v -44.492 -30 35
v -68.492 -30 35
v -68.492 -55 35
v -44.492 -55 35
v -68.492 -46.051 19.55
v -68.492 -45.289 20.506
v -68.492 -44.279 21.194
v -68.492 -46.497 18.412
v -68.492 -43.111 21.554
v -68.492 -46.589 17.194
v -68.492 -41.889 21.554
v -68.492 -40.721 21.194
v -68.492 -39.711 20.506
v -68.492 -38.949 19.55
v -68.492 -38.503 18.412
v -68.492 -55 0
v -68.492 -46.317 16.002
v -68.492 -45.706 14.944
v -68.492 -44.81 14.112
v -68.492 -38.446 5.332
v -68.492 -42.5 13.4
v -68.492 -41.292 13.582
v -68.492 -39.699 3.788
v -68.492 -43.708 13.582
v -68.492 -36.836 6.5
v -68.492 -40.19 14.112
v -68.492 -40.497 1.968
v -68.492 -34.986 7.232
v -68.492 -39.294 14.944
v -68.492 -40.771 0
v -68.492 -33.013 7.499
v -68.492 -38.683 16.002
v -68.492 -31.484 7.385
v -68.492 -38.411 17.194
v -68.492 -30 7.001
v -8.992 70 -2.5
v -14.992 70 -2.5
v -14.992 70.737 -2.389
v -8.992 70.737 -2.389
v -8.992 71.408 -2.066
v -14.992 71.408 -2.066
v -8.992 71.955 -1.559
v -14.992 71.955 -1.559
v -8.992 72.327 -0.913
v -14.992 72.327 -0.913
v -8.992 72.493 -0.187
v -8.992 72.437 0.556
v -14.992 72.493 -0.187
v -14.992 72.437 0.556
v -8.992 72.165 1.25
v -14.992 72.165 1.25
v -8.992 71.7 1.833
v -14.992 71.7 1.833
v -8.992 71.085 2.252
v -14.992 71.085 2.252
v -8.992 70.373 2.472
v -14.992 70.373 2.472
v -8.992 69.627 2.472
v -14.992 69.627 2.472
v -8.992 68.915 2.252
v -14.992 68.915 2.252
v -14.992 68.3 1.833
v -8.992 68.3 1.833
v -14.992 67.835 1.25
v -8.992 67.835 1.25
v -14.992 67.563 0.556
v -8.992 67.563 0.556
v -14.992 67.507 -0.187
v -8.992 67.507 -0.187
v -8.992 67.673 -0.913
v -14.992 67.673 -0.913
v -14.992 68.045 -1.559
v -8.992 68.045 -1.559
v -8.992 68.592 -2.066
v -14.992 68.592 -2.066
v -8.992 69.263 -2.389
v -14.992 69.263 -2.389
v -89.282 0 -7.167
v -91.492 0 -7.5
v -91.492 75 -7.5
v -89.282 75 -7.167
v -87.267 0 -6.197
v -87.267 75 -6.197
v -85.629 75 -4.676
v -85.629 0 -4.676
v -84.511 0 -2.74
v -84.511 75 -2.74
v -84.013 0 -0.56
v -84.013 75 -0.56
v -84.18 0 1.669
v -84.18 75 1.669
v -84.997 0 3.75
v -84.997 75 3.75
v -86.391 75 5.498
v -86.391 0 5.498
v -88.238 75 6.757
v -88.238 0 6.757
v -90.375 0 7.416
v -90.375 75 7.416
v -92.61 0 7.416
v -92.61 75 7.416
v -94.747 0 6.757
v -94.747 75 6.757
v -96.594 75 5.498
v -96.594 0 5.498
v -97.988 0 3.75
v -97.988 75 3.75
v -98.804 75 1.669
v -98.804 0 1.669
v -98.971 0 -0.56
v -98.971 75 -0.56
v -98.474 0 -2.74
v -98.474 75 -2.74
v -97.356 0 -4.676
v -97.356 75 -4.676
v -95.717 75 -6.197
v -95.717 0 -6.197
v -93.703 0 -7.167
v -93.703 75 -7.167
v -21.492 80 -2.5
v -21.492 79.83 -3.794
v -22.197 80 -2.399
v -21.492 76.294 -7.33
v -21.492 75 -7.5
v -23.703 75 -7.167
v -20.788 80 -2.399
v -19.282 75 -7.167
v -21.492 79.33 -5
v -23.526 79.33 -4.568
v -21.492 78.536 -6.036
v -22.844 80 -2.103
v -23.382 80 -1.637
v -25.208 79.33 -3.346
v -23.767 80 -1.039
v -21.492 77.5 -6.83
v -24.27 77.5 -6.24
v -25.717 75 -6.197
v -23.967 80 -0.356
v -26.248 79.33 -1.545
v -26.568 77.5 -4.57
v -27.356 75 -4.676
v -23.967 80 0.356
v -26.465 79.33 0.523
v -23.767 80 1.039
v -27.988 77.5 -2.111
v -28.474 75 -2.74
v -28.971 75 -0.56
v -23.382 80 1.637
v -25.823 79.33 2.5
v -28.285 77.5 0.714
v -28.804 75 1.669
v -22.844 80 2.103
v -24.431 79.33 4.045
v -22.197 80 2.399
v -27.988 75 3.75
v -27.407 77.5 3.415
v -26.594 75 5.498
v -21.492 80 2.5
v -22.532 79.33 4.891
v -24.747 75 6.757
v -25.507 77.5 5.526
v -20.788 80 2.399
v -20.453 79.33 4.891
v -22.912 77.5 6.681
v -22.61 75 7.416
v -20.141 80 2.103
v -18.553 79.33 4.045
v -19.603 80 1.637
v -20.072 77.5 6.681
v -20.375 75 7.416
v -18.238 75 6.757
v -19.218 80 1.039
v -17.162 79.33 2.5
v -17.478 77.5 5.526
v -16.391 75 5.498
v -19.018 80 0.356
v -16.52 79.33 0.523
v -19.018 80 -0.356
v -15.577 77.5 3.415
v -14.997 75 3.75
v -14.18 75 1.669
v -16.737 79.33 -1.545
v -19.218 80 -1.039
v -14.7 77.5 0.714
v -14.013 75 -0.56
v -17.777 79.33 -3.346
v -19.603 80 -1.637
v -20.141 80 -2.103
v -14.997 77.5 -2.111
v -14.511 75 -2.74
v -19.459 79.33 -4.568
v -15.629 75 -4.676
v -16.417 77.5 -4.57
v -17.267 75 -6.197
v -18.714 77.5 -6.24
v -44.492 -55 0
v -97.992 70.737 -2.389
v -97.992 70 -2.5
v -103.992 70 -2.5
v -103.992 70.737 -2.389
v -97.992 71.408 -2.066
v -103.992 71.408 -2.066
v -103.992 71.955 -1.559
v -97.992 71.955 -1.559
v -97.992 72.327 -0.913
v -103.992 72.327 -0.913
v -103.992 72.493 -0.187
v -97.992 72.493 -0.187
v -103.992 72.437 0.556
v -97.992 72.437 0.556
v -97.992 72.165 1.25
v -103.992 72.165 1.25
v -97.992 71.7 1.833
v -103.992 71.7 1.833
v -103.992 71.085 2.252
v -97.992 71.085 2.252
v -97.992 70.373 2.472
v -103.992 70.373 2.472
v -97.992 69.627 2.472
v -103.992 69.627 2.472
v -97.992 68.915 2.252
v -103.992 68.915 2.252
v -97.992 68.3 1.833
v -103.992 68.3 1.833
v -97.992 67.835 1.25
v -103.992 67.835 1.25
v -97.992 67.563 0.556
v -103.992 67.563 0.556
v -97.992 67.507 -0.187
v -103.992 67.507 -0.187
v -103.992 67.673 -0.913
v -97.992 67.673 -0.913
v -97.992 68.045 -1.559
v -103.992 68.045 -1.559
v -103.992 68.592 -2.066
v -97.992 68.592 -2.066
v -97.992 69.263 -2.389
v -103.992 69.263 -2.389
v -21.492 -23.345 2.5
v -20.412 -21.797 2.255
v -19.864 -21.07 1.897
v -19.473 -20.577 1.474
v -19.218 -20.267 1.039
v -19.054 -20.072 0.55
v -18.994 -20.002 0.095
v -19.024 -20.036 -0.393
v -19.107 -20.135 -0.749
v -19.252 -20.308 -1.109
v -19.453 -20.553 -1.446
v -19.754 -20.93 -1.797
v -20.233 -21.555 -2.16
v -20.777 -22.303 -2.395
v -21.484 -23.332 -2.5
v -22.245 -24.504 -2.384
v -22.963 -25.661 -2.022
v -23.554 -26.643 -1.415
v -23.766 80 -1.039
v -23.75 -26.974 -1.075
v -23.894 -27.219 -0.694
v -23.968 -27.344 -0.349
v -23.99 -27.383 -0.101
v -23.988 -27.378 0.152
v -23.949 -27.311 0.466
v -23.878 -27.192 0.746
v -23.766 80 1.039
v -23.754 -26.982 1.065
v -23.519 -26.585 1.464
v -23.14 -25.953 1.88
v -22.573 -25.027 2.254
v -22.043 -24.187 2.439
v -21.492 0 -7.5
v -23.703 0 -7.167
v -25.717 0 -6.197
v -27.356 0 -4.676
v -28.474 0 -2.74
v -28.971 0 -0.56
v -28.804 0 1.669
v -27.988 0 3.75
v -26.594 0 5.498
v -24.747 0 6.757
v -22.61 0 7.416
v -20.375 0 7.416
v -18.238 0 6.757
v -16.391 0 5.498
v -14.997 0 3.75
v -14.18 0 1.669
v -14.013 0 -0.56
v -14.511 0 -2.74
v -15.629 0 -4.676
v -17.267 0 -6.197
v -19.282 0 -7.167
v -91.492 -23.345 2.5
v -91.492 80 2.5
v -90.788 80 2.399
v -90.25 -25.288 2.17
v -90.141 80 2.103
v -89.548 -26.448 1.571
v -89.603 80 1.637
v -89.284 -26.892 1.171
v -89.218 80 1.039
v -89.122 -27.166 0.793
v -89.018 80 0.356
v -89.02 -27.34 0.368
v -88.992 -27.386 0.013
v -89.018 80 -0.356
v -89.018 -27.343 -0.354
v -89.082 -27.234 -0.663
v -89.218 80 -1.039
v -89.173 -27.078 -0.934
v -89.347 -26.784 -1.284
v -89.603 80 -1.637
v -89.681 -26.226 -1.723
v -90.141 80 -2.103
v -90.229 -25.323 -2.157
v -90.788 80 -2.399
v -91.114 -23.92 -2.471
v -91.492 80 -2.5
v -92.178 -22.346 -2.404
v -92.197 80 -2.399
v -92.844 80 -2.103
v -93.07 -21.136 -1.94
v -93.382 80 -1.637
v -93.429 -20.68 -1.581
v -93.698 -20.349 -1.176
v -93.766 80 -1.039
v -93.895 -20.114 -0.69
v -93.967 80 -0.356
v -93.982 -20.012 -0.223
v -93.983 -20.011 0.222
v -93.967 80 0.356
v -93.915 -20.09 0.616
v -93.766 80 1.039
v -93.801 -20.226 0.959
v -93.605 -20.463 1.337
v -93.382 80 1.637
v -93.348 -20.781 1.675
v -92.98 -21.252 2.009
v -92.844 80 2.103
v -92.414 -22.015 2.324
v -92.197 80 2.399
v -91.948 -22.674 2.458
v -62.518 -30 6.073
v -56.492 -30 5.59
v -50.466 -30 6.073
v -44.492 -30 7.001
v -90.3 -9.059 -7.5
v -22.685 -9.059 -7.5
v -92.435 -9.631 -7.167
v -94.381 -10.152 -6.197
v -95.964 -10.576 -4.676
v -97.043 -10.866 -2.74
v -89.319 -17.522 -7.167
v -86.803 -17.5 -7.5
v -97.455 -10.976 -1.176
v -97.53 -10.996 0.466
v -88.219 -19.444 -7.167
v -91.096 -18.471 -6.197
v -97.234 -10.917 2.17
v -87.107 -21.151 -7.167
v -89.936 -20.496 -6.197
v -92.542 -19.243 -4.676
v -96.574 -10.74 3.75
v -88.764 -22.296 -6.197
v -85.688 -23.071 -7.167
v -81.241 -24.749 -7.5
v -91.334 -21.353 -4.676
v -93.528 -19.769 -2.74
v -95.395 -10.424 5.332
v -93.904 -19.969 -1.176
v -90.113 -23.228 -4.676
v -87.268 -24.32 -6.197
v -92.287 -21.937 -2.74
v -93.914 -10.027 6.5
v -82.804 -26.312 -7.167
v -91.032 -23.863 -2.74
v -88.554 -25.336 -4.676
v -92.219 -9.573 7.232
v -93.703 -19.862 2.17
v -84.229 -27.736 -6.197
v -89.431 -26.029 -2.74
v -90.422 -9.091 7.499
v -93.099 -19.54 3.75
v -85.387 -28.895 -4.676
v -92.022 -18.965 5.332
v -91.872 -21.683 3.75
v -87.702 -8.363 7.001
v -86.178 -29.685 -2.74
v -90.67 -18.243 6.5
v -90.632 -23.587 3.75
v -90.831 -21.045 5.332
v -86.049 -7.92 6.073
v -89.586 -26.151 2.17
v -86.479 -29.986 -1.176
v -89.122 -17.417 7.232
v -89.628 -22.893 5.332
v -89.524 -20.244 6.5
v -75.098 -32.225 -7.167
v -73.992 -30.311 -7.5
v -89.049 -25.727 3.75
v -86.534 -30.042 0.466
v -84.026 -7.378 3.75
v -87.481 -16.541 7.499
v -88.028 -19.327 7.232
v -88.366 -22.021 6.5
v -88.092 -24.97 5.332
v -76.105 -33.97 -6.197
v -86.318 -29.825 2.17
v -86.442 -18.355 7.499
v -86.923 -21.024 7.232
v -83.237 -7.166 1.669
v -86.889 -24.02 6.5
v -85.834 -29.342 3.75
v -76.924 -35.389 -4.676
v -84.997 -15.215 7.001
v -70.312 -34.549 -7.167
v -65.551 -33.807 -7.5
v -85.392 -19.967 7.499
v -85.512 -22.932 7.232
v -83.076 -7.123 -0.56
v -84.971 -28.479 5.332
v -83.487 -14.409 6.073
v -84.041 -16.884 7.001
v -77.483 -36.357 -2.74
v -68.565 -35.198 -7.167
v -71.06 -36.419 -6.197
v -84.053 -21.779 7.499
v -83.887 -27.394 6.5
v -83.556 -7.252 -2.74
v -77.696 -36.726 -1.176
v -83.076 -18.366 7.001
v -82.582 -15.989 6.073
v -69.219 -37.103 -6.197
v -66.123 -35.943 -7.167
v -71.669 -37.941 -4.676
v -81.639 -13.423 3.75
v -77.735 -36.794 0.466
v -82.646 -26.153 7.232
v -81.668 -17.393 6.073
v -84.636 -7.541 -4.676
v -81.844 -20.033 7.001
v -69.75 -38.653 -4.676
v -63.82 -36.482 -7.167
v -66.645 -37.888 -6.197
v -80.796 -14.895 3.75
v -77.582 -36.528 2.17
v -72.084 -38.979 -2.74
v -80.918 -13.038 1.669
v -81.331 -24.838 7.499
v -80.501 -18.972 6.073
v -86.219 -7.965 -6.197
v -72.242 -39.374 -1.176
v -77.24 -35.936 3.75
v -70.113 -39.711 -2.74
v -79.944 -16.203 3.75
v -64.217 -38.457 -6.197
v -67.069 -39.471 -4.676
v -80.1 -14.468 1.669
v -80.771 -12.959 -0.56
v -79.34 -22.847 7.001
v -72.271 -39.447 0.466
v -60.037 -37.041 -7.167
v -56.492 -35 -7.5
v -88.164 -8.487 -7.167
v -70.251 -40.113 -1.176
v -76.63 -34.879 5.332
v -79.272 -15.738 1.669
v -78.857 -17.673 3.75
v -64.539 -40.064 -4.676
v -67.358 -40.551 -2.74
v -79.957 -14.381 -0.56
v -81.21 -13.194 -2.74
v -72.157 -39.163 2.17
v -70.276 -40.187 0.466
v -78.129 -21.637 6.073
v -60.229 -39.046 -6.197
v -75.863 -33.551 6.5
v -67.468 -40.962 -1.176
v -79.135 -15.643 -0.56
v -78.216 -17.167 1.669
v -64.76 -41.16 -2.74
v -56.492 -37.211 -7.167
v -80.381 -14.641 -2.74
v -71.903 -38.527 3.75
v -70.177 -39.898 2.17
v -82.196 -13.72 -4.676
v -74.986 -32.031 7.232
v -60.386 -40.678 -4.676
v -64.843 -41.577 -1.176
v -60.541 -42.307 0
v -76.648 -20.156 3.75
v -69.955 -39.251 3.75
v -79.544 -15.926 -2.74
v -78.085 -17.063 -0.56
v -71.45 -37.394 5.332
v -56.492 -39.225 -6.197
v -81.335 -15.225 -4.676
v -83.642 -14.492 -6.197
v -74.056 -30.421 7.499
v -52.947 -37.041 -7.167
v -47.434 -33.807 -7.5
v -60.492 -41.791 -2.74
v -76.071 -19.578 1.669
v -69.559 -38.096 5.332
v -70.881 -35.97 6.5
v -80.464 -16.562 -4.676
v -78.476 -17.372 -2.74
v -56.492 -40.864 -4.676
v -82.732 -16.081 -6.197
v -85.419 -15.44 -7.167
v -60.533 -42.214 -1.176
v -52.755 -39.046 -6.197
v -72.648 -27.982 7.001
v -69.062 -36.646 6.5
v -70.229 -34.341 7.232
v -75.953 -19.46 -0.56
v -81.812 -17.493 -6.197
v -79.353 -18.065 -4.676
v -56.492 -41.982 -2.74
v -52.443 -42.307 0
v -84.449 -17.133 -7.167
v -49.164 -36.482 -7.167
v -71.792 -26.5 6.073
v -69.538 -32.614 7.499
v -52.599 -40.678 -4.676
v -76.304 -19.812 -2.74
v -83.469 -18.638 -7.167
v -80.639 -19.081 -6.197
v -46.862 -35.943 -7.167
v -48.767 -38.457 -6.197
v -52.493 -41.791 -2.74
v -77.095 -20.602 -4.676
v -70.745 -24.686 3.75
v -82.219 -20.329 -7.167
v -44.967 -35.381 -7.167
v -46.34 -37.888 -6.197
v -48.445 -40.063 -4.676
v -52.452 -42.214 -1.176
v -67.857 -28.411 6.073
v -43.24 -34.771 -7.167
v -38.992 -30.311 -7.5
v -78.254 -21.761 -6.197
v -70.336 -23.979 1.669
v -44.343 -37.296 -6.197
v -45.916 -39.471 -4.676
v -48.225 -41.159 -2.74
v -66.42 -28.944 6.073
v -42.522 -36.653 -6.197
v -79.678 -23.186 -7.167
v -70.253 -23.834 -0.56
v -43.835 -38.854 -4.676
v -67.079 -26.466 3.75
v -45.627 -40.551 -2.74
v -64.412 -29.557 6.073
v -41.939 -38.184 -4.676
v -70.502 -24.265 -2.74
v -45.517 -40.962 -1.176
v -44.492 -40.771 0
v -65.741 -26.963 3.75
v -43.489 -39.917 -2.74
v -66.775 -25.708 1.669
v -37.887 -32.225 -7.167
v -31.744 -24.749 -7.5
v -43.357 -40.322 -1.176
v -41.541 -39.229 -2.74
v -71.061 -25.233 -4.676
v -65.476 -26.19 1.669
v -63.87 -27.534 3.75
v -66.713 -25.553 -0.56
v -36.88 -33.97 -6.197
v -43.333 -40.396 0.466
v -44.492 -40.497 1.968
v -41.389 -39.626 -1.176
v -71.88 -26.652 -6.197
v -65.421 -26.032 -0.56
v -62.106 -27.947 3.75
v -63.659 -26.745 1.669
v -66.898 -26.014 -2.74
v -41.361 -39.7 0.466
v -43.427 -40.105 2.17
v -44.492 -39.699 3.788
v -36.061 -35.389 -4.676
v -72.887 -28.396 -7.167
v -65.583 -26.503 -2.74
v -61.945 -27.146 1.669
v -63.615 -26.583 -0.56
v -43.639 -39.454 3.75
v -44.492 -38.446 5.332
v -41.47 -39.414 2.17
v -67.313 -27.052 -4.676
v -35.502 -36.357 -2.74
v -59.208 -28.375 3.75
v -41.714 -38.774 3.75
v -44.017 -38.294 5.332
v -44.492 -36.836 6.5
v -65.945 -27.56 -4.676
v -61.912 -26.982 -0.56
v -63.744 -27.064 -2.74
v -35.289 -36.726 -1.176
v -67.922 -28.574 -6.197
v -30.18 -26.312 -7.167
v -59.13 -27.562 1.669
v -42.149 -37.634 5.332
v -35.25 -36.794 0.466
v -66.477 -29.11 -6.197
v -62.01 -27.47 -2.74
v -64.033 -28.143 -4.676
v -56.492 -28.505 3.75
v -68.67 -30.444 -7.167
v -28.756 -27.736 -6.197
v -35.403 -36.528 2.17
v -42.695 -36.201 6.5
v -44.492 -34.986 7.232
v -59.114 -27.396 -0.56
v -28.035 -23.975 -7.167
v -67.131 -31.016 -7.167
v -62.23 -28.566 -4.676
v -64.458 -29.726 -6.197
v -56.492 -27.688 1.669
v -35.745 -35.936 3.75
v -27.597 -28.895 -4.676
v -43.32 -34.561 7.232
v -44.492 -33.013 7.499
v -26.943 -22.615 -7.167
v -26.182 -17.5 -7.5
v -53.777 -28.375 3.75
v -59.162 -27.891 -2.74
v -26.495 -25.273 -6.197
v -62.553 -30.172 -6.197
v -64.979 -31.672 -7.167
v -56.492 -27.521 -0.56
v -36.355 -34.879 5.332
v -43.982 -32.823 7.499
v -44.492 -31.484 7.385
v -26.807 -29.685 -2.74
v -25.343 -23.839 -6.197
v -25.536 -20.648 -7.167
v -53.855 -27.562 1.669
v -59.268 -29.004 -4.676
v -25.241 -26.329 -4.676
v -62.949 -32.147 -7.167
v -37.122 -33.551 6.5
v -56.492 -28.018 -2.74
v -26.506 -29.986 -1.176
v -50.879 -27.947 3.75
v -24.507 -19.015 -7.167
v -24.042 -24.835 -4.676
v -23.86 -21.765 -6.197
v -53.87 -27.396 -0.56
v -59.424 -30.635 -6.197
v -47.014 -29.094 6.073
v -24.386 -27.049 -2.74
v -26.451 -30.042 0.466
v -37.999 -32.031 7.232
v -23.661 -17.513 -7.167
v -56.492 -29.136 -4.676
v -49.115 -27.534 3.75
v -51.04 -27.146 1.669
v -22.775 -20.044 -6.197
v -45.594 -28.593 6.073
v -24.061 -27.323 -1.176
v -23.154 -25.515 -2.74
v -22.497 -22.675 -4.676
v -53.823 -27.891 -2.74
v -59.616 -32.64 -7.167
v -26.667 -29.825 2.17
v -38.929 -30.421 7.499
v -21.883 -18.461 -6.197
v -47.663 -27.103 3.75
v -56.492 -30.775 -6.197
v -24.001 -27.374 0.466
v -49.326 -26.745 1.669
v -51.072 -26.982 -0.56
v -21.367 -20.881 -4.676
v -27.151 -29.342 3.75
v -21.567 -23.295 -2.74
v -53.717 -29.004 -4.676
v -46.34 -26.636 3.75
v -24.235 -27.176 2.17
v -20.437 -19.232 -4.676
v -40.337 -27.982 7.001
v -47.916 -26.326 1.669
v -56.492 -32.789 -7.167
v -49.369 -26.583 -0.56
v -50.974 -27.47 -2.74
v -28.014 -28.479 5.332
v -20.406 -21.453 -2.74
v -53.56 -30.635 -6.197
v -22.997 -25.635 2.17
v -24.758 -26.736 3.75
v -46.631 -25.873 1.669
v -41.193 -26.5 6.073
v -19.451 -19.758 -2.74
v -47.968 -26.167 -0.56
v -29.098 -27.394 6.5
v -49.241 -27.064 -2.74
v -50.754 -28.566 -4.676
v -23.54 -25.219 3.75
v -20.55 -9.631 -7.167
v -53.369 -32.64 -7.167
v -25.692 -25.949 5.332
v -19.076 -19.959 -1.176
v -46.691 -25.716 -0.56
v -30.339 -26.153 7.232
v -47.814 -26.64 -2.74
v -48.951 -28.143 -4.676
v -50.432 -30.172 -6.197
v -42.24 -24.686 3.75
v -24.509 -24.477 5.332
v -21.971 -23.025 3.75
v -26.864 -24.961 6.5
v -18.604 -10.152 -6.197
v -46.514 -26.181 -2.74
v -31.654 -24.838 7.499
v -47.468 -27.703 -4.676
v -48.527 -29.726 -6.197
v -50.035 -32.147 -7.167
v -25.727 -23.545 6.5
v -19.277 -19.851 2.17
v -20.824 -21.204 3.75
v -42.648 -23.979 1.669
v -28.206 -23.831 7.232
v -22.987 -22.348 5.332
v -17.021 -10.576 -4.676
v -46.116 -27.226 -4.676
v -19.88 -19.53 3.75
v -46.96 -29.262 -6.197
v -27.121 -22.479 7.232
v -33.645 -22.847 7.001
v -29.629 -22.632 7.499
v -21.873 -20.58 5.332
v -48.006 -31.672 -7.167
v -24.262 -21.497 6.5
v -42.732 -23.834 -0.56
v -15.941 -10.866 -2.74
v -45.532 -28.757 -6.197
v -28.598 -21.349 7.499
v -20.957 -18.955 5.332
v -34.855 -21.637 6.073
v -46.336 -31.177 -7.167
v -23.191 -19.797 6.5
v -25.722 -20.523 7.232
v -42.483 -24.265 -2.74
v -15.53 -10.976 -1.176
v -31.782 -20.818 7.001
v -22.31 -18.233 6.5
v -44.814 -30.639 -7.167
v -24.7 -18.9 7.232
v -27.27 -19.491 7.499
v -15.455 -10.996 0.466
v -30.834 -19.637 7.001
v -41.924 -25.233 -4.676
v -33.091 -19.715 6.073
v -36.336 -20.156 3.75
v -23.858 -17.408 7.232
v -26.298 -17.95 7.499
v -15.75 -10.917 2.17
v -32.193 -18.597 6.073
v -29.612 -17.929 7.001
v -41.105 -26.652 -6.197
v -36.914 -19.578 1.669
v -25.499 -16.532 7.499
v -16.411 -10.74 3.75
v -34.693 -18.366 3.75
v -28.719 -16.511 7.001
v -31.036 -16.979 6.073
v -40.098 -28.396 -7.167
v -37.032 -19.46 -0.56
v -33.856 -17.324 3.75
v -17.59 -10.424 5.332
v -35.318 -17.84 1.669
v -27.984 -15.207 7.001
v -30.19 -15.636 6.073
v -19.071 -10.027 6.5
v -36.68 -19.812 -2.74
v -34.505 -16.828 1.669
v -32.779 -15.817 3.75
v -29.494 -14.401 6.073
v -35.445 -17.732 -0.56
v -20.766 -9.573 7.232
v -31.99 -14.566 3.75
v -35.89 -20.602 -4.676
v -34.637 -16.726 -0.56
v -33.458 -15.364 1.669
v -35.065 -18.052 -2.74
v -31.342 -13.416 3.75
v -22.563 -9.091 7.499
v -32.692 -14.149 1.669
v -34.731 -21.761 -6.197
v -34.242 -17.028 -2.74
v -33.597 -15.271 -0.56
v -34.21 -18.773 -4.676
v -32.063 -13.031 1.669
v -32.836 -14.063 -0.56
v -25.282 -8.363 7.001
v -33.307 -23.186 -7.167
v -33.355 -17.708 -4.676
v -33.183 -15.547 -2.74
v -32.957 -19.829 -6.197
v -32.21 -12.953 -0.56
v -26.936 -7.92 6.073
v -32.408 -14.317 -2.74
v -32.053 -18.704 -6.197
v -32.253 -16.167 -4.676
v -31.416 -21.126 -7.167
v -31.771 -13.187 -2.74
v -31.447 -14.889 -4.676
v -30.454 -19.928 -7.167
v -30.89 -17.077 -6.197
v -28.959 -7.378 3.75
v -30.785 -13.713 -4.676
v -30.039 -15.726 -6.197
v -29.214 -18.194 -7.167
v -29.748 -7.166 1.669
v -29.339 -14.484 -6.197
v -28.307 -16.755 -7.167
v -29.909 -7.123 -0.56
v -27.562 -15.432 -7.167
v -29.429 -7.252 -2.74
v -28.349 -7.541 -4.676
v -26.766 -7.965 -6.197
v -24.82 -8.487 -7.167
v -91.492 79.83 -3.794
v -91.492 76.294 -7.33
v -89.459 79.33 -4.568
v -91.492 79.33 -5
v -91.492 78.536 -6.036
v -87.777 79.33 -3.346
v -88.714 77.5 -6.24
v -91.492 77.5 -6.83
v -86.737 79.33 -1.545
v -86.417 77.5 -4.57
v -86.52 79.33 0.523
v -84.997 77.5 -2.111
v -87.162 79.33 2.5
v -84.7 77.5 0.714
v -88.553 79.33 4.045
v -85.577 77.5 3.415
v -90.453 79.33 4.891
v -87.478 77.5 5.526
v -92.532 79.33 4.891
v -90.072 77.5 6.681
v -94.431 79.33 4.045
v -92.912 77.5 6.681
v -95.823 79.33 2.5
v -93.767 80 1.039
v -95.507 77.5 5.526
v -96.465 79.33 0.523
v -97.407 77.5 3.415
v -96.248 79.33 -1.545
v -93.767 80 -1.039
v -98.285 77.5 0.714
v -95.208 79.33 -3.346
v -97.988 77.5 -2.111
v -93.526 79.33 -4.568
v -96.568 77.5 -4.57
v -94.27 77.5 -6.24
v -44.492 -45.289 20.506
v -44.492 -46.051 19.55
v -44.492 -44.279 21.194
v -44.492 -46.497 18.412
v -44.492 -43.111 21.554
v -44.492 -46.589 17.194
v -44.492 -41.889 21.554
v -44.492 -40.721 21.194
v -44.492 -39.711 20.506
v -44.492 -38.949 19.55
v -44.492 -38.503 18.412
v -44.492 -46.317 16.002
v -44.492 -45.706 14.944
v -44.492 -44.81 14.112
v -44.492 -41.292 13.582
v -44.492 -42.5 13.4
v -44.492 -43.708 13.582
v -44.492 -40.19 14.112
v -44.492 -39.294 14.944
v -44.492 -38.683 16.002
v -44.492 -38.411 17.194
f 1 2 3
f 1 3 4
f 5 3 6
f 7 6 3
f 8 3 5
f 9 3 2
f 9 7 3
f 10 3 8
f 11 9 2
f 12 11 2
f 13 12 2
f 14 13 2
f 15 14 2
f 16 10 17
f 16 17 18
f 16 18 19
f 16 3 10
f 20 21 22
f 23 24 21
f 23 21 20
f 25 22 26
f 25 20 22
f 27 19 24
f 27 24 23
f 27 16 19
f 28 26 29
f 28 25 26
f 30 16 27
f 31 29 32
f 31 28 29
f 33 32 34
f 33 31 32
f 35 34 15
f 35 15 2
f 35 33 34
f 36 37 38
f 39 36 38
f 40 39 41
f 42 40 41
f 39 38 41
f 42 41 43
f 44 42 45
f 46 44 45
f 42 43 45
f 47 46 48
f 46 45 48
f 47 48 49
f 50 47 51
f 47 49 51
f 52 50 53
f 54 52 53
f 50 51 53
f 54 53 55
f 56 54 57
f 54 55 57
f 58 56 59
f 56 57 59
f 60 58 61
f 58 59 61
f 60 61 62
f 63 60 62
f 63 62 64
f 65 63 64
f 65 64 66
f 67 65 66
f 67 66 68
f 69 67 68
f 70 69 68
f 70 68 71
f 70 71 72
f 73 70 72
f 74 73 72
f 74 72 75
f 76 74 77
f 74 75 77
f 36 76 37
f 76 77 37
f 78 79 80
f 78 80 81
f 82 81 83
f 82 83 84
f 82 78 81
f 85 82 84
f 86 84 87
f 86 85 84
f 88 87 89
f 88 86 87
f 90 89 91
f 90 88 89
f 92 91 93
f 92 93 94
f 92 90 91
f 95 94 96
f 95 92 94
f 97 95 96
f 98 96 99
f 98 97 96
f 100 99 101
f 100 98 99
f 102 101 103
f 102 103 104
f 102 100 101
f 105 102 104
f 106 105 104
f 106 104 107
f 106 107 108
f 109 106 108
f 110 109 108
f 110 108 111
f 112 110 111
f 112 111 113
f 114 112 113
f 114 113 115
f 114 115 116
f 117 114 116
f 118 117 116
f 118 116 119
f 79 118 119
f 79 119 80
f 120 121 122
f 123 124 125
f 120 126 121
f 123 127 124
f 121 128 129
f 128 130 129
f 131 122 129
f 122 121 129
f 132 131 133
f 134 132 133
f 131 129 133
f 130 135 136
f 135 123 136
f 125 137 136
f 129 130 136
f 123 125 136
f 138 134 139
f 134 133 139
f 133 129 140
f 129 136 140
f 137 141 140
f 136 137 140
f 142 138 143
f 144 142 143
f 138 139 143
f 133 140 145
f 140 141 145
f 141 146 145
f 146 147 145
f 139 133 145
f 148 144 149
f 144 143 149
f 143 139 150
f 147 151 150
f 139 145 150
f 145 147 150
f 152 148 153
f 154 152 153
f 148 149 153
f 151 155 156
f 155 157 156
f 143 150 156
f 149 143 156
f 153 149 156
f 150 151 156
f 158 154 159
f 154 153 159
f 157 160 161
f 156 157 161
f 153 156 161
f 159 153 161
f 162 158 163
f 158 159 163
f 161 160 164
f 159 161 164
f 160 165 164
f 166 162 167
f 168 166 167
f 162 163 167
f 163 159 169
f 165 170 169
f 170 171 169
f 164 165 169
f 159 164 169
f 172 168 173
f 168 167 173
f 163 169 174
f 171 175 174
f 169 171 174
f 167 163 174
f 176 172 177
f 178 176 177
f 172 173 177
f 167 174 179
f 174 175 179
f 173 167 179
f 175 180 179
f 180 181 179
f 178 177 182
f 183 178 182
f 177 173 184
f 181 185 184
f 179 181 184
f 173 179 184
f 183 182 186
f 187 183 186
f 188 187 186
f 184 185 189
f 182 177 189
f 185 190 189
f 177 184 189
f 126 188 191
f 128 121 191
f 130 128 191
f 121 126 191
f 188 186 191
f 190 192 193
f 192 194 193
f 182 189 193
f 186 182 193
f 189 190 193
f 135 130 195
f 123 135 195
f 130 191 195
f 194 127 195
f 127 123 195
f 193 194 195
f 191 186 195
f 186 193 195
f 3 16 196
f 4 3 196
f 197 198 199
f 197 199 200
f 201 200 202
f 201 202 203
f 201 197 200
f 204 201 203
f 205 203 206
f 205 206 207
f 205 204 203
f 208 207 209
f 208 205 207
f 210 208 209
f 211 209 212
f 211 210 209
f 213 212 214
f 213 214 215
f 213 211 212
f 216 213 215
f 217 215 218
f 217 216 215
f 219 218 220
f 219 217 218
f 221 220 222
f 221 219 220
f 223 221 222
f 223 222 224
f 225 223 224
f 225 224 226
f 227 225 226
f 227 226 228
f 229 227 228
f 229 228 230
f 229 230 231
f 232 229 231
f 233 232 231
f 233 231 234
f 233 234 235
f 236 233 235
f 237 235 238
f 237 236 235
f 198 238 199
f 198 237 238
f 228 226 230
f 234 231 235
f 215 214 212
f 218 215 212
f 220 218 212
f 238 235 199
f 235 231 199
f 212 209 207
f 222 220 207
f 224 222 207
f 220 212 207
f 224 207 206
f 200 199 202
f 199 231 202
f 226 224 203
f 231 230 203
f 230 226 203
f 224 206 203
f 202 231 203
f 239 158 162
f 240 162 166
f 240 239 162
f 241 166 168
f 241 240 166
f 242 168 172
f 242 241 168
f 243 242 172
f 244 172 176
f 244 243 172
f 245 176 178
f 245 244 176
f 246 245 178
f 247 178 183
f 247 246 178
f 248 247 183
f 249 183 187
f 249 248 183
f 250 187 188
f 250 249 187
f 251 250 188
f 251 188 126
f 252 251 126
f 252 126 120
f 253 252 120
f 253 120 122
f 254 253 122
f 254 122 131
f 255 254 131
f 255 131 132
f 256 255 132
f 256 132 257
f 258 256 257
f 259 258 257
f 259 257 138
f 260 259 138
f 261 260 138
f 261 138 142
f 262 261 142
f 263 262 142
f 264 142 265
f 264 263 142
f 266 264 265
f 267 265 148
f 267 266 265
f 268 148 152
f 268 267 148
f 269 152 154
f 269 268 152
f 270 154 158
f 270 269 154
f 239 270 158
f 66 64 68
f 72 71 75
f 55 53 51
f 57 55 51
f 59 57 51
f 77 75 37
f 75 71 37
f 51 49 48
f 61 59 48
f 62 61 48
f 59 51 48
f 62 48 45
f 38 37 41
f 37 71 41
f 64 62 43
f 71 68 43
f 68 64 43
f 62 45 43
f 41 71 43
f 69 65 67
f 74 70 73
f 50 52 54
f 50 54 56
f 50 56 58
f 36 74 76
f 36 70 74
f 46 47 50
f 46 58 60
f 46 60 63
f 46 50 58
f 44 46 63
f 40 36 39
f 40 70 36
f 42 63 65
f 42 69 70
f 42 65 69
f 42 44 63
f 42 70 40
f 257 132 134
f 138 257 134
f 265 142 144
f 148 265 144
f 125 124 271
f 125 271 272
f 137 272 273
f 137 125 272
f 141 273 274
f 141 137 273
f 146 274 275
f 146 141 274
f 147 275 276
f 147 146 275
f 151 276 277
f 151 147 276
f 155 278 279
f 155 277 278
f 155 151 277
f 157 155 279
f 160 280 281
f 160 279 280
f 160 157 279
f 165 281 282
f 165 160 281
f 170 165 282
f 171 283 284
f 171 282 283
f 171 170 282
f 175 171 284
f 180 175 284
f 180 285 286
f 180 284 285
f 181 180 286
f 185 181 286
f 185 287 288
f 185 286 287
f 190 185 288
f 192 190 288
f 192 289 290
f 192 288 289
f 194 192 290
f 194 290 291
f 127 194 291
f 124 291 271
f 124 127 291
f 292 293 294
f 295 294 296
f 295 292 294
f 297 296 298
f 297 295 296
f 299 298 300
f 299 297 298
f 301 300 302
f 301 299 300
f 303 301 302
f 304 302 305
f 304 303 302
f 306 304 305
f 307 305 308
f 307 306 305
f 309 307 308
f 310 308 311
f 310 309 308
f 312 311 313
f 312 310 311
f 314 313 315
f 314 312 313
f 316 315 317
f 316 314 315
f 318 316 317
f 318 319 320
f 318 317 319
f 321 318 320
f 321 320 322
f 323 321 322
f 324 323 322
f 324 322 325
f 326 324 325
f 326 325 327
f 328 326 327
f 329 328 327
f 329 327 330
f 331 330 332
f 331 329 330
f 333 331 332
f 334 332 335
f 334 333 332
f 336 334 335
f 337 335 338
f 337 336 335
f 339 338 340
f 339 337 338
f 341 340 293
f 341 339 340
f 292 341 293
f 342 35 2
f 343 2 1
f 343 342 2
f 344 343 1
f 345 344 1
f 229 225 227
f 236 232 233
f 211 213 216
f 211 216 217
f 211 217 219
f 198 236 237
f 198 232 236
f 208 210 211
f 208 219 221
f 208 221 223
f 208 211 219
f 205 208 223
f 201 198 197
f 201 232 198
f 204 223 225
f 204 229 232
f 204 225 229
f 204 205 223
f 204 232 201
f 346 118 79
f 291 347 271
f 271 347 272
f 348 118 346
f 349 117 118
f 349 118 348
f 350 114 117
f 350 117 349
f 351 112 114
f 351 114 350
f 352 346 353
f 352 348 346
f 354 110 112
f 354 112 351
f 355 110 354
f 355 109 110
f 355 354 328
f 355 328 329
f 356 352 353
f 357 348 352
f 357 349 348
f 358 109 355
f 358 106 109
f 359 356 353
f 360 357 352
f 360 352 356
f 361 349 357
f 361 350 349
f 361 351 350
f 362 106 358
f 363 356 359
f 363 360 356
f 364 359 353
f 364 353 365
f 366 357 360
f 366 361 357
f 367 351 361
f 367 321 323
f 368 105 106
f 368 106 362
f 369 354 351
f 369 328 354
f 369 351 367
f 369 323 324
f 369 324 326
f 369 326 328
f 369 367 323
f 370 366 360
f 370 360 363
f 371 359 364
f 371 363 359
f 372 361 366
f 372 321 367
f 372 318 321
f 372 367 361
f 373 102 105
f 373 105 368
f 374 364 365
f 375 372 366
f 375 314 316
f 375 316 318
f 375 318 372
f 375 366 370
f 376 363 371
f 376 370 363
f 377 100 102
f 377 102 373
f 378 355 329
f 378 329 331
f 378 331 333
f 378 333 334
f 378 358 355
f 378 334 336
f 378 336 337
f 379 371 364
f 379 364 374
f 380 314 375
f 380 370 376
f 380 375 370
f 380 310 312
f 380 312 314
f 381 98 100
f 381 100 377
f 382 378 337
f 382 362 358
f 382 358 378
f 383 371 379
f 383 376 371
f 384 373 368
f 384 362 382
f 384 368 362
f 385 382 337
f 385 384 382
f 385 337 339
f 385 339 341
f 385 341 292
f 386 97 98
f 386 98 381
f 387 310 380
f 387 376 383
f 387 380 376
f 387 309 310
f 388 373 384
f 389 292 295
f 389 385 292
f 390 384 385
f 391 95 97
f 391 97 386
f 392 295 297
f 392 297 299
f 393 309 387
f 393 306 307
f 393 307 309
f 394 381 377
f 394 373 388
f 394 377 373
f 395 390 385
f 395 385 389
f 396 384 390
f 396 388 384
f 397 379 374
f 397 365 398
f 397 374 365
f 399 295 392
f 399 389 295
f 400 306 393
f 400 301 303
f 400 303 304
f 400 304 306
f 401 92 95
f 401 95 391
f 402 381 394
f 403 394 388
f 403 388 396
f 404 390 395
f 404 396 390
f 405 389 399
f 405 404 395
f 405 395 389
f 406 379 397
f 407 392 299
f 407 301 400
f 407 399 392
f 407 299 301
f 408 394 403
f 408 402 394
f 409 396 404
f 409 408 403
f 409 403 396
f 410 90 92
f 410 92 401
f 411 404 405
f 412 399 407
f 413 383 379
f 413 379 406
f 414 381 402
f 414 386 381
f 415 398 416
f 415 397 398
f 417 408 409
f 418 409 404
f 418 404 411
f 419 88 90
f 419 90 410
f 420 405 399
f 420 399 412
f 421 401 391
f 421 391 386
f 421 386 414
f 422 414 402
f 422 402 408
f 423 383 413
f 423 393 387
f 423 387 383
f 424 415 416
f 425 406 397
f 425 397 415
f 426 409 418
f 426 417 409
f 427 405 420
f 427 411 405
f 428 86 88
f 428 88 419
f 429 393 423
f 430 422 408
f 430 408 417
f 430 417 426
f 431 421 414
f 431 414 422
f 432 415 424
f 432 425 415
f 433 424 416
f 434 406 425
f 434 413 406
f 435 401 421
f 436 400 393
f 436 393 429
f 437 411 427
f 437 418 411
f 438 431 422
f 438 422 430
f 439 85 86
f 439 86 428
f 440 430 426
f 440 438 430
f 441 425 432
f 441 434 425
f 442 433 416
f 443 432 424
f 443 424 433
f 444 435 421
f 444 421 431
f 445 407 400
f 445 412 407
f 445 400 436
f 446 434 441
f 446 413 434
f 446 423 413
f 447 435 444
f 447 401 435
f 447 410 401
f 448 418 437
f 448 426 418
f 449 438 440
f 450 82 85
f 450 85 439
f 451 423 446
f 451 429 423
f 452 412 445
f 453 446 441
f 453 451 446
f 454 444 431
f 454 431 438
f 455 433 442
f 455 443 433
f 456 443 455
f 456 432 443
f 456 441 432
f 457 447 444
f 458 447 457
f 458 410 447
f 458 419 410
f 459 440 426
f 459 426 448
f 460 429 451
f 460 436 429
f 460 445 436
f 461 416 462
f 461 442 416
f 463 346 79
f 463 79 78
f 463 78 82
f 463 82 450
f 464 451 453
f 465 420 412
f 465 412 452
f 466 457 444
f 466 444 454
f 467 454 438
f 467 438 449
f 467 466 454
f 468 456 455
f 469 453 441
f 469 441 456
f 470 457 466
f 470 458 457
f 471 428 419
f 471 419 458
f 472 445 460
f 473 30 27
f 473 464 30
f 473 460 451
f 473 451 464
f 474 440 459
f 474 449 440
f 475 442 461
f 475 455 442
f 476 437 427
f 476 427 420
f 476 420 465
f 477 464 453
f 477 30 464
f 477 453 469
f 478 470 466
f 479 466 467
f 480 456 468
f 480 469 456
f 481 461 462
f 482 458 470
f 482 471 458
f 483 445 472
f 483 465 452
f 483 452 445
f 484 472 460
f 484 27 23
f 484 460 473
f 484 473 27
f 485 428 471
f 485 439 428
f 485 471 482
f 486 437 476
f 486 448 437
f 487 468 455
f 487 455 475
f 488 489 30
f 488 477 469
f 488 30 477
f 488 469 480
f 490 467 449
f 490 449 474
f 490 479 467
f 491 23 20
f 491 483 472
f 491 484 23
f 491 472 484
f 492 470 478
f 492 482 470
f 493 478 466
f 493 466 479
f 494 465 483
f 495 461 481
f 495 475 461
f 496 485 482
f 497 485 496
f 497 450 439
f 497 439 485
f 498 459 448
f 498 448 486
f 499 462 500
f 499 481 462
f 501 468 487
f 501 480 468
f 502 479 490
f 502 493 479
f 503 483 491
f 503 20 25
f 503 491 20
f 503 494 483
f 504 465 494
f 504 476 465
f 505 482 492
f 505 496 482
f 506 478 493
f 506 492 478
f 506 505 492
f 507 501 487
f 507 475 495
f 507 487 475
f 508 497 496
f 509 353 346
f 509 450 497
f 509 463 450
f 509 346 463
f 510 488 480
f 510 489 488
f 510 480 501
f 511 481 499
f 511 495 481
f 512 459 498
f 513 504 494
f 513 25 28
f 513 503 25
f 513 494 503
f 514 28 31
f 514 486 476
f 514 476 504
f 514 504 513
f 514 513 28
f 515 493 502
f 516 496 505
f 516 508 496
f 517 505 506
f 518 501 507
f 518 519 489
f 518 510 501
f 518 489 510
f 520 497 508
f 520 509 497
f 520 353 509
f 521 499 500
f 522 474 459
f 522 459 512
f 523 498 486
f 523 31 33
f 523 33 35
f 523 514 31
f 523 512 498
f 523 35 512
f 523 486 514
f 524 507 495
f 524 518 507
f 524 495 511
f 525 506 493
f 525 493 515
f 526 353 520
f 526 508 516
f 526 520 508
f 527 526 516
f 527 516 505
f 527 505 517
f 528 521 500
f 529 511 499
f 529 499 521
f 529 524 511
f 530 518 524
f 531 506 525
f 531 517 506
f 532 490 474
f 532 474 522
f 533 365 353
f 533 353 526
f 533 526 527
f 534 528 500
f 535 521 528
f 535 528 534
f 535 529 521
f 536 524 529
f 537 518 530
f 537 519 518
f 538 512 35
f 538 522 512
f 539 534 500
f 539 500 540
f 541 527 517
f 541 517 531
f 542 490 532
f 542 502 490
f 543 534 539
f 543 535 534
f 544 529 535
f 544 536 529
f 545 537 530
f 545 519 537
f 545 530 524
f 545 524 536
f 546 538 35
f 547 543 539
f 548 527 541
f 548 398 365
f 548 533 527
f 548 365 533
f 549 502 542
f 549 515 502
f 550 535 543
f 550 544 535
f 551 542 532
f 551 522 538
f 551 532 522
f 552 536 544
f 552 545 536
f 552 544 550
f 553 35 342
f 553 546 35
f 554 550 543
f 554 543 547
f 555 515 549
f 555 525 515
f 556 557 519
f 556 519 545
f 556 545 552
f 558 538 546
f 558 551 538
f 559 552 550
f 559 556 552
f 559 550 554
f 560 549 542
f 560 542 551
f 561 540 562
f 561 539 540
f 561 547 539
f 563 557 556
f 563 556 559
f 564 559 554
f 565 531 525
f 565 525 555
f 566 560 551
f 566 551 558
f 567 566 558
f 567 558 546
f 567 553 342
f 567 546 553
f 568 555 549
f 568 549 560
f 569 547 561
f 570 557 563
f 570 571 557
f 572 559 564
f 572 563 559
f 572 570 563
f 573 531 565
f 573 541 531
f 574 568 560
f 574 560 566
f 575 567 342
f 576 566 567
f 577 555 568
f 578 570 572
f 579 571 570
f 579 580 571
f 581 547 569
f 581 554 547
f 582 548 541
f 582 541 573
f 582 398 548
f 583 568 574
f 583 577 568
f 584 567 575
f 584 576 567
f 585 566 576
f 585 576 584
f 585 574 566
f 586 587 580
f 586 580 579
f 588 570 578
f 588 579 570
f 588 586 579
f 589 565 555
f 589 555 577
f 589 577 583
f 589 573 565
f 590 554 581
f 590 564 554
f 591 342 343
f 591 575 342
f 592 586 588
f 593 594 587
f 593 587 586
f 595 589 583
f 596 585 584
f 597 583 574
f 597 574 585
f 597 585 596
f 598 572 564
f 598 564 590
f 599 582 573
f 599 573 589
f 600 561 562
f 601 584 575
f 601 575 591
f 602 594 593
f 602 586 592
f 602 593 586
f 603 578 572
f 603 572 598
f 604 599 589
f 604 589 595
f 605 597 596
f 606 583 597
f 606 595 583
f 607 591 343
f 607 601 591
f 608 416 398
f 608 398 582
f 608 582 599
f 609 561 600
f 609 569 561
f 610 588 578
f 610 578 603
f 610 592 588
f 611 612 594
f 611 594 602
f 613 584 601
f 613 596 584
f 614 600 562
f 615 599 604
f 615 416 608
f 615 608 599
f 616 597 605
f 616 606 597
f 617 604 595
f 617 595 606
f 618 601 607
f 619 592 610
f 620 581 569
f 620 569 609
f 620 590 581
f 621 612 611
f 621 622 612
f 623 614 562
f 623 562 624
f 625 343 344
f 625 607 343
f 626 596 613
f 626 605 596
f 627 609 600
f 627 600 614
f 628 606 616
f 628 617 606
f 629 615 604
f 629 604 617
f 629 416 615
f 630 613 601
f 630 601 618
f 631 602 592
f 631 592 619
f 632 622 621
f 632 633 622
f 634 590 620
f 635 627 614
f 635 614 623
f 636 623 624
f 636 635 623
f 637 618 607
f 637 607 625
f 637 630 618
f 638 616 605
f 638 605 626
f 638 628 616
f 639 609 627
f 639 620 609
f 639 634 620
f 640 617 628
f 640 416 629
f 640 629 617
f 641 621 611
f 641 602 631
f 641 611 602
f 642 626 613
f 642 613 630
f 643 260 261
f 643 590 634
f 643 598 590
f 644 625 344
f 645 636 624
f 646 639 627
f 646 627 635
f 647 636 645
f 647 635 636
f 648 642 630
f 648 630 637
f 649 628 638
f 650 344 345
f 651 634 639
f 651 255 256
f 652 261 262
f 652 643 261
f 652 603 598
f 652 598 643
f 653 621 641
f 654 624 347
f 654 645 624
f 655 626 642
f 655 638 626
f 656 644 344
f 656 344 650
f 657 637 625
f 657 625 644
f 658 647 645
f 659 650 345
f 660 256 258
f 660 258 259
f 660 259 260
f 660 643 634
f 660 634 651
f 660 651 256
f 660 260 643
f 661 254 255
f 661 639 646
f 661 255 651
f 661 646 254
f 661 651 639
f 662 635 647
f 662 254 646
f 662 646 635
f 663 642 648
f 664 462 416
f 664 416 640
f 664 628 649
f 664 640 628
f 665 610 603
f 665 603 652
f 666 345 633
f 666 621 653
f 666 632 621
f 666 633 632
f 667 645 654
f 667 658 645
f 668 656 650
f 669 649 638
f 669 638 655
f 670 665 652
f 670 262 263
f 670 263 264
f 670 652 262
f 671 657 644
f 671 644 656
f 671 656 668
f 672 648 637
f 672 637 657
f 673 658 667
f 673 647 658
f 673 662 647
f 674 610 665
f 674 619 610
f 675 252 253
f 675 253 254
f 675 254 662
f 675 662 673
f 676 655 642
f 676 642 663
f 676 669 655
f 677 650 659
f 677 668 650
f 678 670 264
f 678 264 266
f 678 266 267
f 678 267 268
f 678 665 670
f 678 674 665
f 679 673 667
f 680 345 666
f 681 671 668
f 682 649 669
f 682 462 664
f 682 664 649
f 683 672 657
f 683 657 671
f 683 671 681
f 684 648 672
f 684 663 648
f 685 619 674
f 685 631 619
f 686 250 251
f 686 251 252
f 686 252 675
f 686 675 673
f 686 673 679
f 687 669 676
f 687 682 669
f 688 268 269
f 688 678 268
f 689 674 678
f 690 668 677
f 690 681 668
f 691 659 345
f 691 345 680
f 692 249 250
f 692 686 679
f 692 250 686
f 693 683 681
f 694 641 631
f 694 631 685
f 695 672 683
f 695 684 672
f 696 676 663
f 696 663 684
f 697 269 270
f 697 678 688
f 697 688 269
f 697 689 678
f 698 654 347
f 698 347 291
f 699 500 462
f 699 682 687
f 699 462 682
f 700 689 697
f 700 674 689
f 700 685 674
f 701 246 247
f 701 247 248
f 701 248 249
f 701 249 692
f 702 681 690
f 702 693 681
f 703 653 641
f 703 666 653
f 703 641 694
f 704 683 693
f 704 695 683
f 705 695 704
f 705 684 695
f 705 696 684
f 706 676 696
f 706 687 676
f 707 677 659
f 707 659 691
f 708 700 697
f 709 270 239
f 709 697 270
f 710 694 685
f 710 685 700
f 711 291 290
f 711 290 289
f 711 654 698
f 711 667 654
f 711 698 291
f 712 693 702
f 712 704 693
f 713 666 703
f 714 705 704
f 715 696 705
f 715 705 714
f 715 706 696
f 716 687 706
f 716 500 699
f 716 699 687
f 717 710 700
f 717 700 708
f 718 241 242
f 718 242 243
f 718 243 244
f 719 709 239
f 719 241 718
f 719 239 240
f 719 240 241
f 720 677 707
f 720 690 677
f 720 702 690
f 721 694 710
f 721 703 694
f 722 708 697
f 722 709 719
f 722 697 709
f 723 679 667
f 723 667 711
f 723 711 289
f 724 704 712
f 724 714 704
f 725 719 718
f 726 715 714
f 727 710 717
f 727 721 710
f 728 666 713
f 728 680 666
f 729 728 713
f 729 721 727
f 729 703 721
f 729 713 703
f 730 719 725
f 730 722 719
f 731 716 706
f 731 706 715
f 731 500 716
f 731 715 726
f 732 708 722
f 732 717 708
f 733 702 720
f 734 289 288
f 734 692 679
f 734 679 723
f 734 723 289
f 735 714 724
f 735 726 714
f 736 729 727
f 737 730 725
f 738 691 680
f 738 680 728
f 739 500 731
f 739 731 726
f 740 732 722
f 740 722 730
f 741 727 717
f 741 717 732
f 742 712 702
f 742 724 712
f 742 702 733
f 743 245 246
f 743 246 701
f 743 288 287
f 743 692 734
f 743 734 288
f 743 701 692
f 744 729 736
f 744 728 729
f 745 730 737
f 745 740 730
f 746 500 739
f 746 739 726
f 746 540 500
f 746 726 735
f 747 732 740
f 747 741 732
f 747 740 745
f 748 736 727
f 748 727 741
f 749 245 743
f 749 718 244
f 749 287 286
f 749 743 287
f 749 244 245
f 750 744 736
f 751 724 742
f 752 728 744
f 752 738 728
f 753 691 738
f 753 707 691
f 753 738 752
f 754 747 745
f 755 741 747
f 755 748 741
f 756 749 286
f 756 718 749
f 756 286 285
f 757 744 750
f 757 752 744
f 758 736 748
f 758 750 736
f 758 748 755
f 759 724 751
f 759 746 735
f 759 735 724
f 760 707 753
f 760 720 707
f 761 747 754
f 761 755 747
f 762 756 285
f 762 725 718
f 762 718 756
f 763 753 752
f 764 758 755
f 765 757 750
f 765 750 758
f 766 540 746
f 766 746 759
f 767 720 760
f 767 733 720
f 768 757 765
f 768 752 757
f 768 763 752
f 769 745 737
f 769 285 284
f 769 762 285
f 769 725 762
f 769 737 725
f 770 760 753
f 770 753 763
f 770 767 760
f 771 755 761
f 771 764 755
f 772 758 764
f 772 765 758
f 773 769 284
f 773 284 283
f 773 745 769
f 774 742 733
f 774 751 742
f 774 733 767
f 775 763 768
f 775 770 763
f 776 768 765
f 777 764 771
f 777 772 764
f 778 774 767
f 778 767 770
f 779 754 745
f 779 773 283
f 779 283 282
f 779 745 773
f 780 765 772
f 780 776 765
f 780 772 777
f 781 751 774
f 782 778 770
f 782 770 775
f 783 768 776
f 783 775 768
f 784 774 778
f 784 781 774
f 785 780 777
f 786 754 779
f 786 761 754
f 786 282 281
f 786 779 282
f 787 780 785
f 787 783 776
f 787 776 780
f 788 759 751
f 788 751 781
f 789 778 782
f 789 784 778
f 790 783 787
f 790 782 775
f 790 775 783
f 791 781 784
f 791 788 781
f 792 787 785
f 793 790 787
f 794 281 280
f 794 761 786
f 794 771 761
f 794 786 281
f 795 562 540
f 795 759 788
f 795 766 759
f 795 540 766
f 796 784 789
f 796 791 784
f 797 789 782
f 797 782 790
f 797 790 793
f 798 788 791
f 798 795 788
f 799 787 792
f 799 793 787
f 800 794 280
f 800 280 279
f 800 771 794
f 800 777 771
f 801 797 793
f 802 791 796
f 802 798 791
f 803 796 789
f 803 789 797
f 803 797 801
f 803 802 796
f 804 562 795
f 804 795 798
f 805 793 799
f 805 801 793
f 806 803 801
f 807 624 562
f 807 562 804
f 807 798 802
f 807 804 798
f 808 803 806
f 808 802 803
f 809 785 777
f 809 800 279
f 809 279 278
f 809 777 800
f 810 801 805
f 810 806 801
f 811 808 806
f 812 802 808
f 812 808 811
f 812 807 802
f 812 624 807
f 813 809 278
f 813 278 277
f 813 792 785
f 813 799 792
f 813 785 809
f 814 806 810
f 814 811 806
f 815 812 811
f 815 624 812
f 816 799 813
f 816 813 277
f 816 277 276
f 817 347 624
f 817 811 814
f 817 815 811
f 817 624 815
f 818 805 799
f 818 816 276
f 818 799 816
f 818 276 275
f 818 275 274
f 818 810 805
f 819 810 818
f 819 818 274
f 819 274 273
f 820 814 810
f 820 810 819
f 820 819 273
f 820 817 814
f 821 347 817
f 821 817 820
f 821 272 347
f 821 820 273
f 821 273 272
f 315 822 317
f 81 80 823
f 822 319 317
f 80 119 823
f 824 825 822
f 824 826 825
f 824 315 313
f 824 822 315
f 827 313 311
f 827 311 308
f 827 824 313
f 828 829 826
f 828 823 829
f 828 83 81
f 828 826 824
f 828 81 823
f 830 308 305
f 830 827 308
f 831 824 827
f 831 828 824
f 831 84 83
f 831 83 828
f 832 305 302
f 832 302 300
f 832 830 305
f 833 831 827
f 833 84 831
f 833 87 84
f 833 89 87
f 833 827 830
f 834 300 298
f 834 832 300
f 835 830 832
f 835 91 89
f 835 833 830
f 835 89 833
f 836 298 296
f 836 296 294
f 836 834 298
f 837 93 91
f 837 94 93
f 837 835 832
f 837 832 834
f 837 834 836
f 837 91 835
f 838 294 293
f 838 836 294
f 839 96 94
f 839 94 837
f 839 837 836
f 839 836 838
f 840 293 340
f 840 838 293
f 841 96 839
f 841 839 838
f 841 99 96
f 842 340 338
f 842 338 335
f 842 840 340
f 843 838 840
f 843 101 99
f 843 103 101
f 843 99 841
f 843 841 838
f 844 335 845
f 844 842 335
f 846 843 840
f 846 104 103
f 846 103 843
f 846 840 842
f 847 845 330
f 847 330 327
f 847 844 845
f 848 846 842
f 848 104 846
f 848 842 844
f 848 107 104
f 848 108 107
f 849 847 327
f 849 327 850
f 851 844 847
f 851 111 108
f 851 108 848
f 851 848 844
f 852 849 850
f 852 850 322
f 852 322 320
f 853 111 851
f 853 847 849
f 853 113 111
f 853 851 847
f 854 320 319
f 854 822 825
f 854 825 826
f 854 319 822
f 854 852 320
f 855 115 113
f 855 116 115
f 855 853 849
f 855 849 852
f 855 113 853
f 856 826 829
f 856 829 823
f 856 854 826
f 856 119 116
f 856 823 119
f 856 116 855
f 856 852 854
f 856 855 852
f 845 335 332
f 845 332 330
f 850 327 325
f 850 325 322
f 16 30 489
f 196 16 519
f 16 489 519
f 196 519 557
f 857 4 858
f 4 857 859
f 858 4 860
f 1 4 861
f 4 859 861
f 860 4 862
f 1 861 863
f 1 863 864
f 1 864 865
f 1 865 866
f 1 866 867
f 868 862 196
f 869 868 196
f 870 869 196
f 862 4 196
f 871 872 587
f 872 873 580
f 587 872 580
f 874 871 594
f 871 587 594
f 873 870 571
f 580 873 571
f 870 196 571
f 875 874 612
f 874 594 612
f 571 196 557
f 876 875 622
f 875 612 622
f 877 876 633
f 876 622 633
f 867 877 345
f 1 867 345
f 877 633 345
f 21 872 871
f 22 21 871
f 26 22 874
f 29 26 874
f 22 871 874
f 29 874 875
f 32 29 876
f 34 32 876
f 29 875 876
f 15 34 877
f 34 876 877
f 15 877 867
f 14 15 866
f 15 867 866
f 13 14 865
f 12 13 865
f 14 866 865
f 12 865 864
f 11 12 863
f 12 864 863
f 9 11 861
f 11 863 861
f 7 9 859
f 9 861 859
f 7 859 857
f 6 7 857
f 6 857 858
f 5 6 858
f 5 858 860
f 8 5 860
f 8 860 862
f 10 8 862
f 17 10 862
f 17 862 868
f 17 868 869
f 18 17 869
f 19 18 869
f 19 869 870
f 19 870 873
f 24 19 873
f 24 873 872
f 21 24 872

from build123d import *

# Parameters (mm, degrees)
SWEEP1_PROFILE_R        = 7.5
SKETCH7_W               = 24
SKETCH7_H               = 25
BOSS_EXTRUDE1_DEPTH     = 35
SKETCH8_R               = 4.1
CUT_EXTRUDE1_DEPTH      = 103.933230873
CUT_EXTRUDE2_DEPTH      = 133.001873463
CUT_EXTRUDE2_DEPTH_BACK = 133.001873463
SKETCH9_R               = 2.5
BOSS_EXTRUDE2_START     = 41.5
SKETCH11_R              = 2.5
BOSS_EXTRUDE2_DEPTH     = 6
BOSS_EXTRUDE3_START     = -41.5
SKETCH11_2_R            = 2.5
BOSS_EXTRUDE3_DEPTH     = 6
FILLET1_R               = 5


with BuildPart() as part:
    # Sweep1: sweep along a path in Sketch1
    with BuildLine(Plane.XY) as sweep1_path:
        Line((-91.492396531, 80), (-91.492396531, 0))
        ThreePointArc((-91.492396531, 0), (-56.492396531, -35), (-21.492396531, 0))
        Line((-21.492396531, 0), (-21.492396531, 80))
    # Sweep1 profile (on start of the path) → Sweep1 (sweep)
    with BuildSketch(Plane(origin=(-91.492396531, 80, 0), x_dir=(0, 0, -1), z_dir=(0, -1, 0))):
        Circle(SWEEP1_PROFILE_R)
    sweep(path=sweep1_path.line)

    # Sketch7 → Boss-Extrude1 (add)
    with BuildSketch(Plane.XY):
        with Locations((-56.492396531, -42.5)):
            Rectangle(SKETCH7_W, SKETCH7_H)
    extrude(amount=BOSS_EXTRUDE1_DEPTH)

    # Sketch8 → Cut-Extrude1 (cut, through all)
    with BuildSketch(Plane(origin=(-44.492396531, 0, 0), x_dir=(0, 0, -1), z_dir=(1, 0, 0))):
        with Locations((-17.5, -42.5)):
            Circle(SKETCH8_R)
    extrude(amount=-CUT_EXTRUDE1_DEPTH, mode=Mode.SUBTRACT)

    # Sketch9 → Cut-Extrude2 (cut, two sides: drawn at the far end of the back side and taken through both)
    with BuildSketch(Plane(origin=(0, 0, 0), x_dir=(1, 0, 0), z_dir=(0, 1, 0)).offset(-CUT_EXTRUDE2_DEPTH_BACK)):
        with Locations(Location((-91.492396531, 0, 0), (0, 0, 270))):
            Circle(SKETCH9_R)
        with Locations(Location((-21.492396531, 0, 0), (0, 0, 270))):
            Circle(SKETCH9_R)
    extrude(amount=CUT_EXTRUDE2_DEPTH + CUT_EXTRUDE2_DEPTH_BACK, mode=Mode.SUBTRACT)

    # Fillet1
    fillet1_edges = [part.edges().sort_by_distance(p)[0] for p in [
        (-21.492396531, 80, 7.5),
        (-91.492396531, 80, 7.5),
    ]]
    fillet(fillet1_edges, radius=FILLET1_R - 0.0001)  # a hair under: the kernel refuses the full size


with BuildPart() as body_2:
    # Sketch11 → Boss-Extrude2 (new body)
    with BuildSketch(Plane(origin=(-56.492396531, 0, 0), x_dir=(0, 0, -1), z_dir=(1, 0, 0)).offset(BOSS_EXTRUDE2_START)):
        with Locations((0, 70)):
            Circle(SKETCH11_R)
    extrude(amount=BOSS_EXTRUDE2_DEPTH)


with BuildPart() as body_3:
    # Sketch11<2> → Boss-Extrude3 (new body)
    with BuildSketch(Plane(origin=(-56.492396531, 0, 0), x_dir=(0, 0, -1), z_dir=(1, 0, 0)).offset(BOSS_EXTRUDE3_START)):
        with Locations((0, 70)):
            Circle(SKETCH11_2_R)
    extrude(amount=-BOSS_EXTRUDE3_DEPTH)


solid = Compound([part.part, body_2.part, body_3.part])
